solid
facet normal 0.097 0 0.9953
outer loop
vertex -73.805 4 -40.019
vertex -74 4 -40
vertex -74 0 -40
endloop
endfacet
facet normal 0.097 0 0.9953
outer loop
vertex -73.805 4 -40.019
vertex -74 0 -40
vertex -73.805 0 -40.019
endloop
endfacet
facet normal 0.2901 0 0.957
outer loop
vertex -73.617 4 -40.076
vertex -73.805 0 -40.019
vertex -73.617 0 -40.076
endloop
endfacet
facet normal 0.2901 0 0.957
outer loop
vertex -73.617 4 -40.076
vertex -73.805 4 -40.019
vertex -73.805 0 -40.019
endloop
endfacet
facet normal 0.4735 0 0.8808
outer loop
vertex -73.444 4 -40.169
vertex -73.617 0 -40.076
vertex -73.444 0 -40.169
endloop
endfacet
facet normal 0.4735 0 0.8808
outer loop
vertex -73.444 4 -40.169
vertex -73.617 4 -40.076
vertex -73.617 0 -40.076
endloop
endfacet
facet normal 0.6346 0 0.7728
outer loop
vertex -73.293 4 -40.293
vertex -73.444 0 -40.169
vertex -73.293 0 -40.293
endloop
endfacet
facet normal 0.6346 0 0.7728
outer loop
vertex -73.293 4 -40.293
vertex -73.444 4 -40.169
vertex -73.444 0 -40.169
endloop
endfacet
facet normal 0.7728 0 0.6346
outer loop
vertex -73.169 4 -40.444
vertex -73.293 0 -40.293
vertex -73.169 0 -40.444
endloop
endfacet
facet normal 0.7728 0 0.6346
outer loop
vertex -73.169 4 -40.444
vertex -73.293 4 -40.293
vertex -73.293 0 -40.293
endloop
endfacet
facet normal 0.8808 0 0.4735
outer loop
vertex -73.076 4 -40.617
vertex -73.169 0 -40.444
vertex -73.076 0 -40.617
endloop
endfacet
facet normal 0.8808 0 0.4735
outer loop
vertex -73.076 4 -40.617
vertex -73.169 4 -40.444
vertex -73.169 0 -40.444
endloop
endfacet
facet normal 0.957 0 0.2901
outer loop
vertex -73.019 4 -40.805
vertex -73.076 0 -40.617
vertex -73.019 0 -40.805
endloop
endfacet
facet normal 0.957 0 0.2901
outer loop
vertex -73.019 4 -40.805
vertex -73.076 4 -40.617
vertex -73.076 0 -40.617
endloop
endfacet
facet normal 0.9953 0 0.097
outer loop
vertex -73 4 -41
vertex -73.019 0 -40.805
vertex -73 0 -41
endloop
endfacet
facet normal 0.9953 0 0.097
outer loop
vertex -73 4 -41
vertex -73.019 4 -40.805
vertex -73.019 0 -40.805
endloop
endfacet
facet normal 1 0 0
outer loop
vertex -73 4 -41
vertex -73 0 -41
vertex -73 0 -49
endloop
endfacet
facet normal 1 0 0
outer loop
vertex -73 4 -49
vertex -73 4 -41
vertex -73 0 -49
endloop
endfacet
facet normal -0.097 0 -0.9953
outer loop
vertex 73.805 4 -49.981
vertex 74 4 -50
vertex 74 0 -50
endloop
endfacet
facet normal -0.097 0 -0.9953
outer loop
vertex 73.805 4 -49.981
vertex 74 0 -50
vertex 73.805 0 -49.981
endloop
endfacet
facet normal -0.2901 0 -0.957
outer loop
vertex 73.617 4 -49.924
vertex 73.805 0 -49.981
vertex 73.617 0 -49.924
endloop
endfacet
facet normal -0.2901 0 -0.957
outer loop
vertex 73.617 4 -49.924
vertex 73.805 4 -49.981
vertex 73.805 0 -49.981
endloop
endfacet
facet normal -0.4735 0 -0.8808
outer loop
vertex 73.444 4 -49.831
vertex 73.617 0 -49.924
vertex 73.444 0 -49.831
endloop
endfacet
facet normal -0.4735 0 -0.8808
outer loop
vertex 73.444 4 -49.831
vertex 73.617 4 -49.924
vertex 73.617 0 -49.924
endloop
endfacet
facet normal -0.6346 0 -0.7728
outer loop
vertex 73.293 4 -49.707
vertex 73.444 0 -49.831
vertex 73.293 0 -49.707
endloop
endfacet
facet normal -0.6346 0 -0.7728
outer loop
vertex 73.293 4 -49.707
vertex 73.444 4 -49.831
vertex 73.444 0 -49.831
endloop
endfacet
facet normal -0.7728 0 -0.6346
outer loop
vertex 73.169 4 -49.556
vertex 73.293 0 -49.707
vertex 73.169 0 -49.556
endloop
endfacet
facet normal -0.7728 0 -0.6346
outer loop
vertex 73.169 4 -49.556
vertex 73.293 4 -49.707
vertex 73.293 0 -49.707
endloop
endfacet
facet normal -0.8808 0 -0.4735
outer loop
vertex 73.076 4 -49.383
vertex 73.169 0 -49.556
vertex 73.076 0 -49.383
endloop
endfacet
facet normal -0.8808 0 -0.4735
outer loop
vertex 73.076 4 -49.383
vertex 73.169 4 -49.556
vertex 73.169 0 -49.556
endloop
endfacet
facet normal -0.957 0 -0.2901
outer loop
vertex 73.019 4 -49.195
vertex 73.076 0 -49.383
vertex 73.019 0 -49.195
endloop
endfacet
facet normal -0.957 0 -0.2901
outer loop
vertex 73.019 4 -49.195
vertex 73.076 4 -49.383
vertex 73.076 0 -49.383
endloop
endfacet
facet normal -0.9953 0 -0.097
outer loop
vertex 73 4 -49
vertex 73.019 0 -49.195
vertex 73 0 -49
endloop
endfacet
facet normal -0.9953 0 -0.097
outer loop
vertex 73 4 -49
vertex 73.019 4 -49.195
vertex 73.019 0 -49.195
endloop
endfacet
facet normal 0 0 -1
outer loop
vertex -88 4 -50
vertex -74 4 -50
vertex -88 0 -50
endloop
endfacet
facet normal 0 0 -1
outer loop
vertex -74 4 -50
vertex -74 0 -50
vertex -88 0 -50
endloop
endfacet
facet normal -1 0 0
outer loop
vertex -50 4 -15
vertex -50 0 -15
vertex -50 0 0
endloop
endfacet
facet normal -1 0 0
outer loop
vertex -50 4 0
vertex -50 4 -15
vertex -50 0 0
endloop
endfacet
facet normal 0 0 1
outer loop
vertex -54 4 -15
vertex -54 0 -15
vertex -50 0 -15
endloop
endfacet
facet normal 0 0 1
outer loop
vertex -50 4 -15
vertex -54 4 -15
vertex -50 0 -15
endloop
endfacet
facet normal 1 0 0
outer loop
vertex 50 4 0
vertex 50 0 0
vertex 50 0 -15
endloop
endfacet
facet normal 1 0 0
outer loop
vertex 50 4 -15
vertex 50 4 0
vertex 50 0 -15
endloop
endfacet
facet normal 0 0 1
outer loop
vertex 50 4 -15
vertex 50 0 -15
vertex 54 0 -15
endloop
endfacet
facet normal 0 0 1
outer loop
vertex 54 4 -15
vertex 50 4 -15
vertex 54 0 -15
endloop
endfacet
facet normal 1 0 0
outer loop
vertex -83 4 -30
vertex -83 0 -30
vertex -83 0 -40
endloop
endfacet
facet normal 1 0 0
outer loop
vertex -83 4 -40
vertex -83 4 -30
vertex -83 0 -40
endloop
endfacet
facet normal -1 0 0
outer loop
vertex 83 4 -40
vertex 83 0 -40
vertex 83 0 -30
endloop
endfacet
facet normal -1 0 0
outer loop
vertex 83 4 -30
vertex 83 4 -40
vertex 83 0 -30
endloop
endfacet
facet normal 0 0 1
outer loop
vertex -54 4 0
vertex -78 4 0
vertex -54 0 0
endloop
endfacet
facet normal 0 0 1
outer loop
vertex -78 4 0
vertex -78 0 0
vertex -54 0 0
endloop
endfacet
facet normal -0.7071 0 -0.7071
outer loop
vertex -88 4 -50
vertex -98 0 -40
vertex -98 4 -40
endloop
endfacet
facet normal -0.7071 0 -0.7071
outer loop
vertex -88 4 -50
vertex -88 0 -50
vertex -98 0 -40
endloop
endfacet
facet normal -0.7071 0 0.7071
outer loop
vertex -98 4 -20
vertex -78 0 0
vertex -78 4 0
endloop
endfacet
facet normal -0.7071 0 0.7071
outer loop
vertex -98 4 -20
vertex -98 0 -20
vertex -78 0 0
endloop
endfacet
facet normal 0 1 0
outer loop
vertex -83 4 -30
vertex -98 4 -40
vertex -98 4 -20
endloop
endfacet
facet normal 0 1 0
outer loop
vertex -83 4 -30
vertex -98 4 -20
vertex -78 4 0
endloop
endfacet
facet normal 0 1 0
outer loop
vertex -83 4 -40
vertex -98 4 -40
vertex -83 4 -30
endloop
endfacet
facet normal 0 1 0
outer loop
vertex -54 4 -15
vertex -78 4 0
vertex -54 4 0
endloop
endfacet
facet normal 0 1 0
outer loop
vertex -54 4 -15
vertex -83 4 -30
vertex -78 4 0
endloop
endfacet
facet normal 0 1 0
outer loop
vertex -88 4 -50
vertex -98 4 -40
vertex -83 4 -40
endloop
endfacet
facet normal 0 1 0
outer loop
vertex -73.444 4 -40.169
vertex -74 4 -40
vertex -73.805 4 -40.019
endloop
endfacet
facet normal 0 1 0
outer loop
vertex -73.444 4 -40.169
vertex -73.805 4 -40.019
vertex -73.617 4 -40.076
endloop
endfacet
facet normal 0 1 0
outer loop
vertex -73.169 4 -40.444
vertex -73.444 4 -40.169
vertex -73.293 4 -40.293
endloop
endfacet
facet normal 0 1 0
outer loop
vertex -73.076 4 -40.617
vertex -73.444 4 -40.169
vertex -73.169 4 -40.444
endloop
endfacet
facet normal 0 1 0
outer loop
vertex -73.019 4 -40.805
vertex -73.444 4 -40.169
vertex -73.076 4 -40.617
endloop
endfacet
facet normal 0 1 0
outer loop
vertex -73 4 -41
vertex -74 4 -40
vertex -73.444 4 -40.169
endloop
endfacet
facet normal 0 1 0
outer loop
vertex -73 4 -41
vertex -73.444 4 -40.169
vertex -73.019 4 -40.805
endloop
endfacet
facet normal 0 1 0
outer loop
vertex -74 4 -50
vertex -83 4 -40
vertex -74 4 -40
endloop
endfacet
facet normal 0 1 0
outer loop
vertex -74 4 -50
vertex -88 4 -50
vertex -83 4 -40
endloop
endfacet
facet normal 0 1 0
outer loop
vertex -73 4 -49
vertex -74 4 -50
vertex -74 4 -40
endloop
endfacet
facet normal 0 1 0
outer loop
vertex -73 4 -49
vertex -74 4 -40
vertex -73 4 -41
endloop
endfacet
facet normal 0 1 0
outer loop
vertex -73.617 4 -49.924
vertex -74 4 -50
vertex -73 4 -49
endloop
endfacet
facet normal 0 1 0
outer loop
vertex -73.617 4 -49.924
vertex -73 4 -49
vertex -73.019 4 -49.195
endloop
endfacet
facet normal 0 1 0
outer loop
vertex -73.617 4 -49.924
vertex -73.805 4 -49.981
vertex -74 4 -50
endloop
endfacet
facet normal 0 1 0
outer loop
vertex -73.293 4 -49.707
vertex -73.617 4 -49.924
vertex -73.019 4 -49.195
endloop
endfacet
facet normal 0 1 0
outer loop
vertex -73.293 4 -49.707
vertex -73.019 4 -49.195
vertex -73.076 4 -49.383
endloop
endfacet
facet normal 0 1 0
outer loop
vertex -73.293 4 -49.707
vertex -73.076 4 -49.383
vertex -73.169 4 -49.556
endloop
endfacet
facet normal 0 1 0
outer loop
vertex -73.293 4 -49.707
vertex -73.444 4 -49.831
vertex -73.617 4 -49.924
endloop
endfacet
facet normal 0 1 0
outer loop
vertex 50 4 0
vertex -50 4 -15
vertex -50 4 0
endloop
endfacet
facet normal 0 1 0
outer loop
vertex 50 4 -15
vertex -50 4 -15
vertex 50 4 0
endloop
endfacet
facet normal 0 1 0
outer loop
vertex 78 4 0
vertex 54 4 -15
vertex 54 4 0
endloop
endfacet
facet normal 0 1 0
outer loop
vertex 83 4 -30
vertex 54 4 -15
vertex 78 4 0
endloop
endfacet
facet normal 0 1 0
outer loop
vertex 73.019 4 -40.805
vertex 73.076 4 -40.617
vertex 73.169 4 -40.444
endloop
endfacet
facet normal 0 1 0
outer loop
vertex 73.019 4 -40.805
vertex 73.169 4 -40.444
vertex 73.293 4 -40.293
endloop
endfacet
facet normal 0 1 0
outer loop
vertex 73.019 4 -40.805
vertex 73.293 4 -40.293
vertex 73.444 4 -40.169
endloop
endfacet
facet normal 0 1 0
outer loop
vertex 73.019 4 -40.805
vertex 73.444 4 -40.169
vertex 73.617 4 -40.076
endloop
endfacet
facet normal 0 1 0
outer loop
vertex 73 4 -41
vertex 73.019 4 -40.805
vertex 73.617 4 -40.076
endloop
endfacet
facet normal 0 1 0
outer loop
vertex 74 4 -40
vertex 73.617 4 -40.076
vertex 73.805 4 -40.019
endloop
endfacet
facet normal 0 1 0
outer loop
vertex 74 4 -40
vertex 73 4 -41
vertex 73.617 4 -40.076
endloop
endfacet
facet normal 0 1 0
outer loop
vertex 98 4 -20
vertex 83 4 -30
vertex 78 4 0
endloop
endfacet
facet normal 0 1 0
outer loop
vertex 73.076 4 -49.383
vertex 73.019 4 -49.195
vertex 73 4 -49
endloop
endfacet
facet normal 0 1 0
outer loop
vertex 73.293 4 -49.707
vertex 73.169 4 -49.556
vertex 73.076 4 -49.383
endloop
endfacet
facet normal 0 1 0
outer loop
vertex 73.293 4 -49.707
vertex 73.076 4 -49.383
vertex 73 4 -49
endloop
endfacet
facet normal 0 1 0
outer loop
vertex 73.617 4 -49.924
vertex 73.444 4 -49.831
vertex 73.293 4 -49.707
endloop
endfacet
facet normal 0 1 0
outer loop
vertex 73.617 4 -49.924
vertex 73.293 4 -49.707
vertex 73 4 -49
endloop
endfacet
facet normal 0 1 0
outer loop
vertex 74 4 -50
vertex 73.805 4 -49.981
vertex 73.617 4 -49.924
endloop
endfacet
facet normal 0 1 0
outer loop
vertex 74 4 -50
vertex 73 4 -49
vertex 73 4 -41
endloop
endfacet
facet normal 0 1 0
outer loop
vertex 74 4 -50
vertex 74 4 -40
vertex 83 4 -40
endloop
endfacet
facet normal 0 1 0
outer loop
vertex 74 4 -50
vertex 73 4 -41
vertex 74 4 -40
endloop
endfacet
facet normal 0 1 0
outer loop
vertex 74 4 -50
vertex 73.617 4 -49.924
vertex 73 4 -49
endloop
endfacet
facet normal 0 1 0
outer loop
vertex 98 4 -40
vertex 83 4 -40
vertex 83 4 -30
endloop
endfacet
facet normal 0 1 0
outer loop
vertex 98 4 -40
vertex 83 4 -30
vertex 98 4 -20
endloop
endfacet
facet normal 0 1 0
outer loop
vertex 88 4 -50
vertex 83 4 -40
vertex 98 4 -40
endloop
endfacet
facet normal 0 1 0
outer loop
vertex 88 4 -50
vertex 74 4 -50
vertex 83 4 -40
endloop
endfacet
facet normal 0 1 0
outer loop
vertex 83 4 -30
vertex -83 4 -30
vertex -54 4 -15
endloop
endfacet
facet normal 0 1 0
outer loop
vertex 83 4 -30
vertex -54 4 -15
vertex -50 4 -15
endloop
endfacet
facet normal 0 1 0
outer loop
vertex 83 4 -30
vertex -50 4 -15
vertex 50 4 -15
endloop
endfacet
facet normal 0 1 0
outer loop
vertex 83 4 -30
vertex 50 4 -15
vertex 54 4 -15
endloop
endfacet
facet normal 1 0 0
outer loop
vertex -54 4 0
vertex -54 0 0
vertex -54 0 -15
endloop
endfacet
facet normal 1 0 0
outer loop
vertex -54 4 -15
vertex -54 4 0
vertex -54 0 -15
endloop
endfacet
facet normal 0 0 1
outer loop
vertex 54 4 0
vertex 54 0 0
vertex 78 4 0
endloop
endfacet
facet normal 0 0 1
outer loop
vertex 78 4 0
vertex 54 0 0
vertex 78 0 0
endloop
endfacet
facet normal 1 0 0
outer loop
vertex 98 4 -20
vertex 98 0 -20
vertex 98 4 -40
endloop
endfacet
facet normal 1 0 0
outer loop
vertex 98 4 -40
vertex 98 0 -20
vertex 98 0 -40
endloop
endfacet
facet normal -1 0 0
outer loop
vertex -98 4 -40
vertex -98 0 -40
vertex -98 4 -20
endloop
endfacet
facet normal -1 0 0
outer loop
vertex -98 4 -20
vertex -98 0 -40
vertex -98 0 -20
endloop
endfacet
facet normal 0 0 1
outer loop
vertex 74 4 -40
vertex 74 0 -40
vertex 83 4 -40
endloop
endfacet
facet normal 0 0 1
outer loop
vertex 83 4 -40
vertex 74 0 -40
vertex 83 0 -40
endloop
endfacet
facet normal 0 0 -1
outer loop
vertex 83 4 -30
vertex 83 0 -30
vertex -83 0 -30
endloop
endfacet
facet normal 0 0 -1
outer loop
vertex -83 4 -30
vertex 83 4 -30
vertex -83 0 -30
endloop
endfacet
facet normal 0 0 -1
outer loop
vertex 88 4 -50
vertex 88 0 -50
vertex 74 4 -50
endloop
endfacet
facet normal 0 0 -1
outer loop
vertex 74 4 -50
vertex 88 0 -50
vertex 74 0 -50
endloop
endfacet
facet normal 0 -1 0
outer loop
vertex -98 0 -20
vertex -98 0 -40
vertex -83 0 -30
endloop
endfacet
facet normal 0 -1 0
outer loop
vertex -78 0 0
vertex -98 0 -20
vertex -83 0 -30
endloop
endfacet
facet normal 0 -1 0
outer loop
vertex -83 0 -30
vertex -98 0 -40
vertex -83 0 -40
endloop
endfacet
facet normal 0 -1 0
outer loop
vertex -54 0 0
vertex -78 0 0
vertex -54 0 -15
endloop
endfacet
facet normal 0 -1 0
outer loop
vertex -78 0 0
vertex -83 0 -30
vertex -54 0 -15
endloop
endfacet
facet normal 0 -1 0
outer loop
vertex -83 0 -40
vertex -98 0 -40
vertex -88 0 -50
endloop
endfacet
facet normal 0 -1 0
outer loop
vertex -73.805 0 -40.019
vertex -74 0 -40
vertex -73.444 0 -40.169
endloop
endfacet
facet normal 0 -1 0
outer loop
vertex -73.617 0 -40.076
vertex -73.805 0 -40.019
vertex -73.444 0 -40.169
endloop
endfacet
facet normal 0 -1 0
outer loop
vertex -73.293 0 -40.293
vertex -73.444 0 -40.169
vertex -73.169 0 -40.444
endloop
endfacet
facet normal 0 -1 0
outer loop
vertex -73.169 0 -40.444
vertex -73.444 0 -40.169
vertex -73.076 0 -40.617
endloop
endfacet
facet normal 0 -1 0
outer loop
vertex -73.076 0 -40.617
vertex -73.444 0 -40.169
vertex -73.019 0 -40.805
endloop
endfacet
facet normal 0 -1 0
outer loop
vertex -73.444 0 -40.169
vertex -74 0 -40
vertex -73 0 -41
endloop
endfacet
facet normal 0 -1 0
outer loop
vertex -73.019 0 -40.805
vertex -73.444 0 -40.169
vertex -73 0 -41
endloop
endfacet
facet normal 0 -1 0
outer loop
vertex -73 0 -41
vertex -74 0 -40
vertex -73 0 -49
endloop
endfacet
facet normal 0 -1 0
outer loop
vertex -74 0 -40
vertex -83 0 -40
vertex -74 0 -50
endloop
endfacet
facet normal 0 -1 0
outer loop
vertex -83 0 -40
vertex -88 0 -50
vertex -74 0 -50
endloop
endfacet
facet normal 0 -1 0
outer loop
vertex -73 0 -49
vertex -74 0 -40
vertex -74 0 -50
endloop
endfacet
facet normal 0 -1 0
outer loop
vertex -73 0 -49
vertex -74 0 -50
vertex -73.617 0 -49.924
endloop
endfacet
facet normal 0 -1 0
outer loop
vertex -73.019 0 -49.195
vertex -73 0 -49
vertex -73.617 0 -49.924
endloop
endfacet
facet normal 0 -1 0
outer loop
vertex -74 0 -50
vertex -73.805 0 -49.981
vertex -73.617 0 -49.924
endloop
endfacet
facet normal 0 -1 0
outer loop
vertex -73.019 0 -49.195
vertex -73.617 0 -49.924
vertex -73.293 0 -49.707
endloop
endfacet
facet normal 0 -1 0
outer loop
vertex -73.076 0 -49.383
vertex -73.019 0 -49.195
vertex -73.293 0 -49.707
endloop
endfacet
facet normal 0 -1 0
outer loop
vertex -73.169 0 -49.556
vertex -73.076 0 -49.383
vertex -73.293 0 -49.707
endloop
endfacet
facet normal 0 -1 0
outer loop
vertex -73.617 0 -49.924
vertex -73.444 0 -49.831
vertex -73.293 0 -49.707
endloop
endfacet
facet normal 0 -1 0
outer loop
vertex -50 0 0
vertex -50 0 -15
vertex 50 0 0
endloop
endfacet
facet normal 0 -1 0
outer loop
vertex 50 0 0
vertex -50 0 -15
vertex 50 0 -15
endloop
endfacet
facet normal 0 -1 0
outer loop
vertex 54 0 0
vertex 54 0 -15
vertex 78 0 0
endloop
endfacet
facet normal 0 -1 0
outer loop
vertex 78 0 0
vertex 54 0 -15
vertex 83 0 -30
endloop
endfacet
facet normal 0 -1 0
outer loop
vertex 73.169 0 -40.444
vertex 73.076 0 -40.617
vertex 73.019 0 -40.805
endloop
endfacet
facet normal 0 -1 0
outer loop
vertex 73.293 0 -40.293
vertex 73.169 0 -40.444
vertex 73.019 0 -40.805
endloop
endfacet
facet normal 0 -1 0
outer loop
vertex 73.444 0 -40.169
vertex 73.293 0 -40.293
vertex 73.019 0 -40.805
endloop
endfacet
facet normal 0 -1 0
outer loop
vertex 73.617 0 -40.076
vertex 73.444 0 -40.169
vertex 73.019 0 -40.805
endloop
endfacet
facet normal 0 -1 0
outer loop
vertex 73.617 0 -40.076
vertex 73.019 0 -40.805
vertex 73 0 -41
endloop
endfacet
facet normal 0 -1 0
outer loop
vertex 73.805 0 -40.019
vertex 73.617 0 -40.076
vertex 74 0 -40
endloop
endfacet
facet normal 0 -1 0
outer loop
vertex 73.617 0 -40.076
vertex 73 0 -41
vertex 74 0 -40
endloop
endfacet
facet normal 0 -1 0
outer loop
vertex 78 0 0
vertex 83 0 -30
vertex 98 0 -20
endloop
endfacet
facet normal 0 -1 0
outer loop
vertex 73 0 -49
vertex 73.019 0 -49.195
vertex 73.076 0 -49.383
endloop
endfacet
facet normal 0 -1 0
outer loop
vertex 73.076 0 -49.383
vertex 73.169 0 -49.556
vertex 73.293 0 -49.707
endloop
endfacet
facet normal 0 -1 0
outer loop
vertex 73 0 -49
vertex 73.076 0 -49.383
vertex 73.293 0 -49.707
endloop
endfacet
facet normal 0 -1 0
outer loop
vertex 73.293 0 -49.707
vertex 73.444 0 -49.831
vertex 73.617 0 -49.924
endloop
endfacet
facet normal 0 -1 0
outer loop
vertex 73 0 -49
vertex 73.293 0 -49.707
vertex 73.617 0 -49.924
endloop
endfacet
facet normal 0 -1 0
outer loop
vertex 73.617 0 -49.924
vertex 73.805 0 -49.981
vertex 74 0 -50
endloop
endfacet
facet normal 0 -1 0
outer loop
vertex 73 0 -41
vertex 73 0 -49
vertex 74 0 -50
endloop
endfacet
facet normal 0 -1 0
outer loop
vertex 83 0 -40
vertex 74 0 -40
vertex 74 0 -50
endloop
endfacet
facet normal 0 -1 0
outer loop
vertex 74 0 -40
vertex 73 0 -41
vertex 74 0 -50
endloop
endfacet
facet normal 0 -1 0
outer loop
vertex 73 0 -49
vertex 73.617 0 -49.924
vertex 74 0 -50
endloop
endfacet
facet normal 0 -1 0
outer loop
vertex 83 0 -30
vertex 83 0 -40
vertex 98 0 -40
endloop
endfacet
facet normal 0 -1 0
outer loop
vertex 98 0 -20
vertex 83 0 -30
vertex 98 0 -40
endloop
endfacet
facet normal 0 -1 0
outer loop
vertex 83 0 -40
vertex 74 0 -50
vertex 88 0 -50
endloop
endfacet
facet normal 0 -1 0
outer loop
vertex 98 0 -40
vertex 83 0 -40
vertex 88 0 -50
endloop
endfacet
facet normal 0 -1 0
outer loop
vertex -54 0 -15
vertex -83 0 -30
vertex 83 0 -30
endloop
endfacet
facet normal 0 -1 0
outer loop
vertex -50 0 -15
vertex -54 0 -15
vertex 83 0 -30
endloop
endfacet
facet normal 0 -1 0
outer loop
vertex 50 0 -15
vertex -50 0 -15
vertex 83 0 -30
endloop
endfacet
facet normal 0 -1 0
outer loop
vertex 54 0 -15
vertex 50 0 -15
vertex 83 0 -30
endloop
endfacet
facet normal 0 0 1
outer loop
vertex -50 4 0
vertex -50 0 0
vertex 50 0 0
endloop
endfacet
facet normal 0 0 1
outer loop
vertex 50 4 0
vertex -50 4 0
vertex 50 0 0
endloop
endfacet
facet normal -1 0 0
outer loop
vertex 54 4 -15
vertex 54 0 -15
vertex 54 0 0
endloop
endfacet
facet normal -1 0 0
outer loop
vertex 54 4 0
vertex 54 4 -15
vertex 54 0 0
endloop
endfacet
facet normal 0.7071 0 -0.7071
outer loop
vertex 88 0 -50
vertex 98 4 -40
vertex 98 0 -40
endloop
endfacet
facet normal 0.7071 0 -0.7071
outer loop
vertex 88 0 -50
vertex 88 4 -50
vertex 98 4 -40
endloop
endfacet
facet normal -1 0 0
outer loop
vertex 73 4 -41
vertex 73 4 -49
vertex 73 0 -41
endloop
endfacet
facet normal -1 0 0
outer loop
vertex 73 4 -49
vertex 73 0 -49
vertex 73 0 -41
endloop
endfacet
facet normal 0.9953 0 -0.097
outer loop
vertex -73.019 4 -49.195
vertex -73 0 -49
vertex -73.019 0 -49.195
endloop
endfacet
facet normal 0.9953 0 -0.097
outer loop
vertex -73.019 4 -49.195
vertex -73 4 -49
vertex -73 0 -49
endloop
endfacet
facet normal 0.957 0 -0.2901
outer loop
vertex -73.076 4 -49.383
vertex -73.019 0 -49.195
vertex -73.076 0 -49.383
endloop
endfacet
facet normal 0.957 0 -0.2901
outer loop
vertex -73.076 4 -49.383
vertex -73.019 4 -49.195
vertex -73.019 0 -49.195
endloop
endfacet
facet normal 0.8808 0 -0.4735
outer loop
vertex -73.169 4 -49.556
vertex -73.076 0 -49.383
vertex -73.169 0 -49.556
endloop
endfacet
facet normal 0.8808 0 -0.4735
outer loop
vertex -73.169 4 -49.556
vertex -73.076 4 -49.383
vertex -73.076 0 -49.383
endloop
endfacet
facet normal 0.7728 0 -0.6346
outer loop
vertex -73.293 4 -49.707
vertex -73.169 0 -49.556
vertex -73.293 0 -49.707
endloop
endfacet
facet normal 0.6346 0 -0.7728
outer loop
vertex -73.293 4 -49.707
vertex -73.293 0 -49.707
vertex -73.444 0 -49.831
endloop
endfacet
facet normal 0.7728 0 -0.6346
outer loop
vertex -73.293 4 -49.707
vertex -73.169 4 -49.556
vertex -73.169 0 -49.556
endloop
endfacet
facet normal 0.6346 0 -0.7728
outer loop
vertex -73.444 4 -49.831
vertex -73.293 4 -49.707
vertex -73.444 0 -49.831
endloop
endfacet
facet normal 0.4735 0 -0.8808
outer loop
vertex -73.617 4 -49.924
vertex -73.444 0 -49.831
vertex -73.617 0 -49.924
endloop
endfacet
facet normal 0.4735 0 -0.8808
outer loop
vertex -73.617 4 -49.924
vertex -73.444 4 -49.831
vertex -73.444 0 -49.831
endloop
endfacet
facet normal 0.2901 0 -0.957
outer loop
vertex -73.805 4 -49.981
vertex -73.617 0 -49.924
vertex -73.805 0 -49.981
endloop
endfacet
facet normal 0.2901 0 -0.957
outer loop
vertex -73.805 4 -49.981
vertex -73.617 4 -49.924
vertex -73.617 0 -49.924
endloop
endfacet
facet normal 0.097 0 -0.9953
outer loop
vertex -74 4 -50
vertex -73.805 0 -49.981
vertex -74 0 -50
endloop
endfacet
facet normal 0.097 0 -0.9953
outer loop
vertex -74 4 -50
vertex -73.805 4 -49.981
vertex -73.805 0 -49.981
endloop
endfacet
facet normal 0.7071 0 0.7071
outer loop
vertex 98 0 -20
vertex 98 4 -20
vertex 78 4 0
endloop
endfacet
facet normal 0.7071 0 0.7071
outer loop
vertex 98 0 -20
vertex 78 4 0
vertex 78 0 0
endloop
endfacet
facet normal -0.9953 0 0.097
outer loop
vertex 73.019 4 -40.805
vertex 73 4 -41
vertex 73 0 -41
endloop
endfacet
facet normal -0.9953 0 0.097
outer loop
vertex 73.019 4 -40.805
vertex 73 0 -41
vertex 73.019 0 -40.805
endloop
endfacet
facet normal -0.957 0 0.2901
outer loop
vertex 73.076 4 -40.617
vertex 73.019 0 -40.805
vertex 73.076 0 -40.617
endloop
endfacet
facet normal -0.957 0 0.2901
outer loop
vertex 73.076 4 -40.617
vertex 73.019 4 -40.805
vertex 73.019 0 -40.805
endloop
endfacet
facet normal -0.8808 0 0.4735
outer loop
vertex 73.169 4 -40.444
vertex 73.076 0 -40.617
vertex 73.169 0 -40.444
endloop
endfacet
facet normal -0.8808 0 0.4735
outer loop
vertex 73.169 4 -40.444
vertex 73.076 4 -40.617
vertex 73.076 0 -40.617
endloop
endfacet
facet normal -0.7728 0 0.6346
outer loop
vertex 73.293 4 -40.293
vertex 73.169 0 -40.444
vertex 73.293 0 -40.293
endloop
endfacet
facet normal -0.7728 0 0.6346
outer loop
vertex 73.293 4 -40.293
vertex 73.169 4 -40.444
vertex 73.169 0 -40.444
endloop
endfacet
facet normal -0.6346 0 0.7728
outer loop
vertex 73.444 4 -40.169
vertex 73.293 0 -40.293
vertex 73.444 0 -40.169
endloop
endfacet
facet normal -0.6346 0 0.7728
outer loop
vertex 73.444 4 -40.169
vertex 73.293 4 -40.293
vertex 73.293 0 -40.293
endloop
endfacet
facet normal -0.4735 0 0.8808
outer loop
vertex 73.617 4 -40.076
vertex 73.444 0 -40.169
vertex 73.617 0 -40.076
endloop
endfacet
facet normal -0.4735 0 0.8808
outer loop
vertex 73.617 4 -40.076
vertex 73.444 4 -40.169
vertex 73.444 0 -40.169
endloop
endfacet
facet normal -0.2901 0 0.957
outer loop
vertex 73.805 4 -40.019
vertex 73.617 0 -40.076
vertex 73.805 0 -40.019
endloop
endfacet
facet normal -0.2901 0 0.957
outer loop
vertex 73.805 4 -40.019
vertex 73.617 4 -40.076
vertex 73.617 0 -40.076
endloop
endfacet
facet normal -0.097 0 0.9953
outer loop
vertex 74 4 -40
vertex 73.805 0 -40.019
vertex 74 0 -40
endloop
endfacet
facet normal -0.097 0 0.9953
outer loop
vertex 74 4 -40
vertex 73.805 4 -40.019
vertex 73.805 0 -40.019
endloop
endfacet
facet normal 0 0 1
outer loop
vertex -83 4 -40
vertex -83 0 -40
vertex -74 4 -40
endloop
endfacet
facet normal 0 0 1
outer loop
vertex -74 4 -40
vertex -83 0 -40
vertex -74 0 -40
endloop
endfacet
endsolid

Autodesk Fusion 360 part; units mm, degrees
sketch "スケッチ1" plane through (0, 0, 0) normal (0, 1, 0) x (1, 0, 0)
  line L0 (98, 0) -> (98, 50)
  line L1 (98, 50) -> (73, 50)
  line L2 (73, 50) -> (73, 40)
  line L3 (73, 40) -> (83, 40)
  line L4 (83, 40) -> (83, 30)
  line L5 (83, 30) -> (-83, 30)
  line L6 (-83, 30) -> (-83, 40)
  line L7 (-83, 40) -> (-73, 40)
  line L8 (-73, 40) -> (-73, 50)
  line L9 (-73, 50) -> (-98, 50)
  line L10 (-98, 50) -> (-98, 0)
  line L11 (-98, 0) -> (-54, 0)
  line L12 (-54, 0) -> (-54, 15)
  line L13 (-54, 15) -> (-50, 15)
  line L14 (-50, 15) -> (-50, 0)
  line L15 (-50, 0) -> (50, 0)
  line L16 (50, 0) -> (50, 15)
  line L17 (50, 15) -> (54, 15)
  line L18 (54, 15) -> (54, 0)
  line L19 (54, 0) -> (98, 0)
  line L20 (-45, 20) -> (45, 20)
  point P0 (0, 30)
  dimension "d1" = 50
  dimension "d3" = 10
  dimension "d4" = 15
  dimension "d5" = 10
  dimension "d6" = 50
  dimension "d7" = 4
  dimension "d8" = 15
  dimension "d9" = 166
  dimension "d10" = 10
  dimension "d16" = 5
  dimension "d17" = 5
  dimension "d23" = 10
extrude "押し出し1" add sketch "スケッチ1" along normal blind 4
chamfer "面取り1" distance 20 angle 45 2 edges at (98, 2, 0) (-98, 2, 0)
chamfer "面取り2" distance 10 angle 45 2 edges at (98, 2, -50) (-98, 2, -50)
hole "穴1" at (0, 0, 0) at (0, 0, 0) direction (0, -1, 0) diameter 3.2 depth 4 tip angle 118
fillet "フィレット1" radius 1 4 edges at (-73, 2, -40) (73, 2, -40) (73, 2, -50) (-73, 2, -50)
